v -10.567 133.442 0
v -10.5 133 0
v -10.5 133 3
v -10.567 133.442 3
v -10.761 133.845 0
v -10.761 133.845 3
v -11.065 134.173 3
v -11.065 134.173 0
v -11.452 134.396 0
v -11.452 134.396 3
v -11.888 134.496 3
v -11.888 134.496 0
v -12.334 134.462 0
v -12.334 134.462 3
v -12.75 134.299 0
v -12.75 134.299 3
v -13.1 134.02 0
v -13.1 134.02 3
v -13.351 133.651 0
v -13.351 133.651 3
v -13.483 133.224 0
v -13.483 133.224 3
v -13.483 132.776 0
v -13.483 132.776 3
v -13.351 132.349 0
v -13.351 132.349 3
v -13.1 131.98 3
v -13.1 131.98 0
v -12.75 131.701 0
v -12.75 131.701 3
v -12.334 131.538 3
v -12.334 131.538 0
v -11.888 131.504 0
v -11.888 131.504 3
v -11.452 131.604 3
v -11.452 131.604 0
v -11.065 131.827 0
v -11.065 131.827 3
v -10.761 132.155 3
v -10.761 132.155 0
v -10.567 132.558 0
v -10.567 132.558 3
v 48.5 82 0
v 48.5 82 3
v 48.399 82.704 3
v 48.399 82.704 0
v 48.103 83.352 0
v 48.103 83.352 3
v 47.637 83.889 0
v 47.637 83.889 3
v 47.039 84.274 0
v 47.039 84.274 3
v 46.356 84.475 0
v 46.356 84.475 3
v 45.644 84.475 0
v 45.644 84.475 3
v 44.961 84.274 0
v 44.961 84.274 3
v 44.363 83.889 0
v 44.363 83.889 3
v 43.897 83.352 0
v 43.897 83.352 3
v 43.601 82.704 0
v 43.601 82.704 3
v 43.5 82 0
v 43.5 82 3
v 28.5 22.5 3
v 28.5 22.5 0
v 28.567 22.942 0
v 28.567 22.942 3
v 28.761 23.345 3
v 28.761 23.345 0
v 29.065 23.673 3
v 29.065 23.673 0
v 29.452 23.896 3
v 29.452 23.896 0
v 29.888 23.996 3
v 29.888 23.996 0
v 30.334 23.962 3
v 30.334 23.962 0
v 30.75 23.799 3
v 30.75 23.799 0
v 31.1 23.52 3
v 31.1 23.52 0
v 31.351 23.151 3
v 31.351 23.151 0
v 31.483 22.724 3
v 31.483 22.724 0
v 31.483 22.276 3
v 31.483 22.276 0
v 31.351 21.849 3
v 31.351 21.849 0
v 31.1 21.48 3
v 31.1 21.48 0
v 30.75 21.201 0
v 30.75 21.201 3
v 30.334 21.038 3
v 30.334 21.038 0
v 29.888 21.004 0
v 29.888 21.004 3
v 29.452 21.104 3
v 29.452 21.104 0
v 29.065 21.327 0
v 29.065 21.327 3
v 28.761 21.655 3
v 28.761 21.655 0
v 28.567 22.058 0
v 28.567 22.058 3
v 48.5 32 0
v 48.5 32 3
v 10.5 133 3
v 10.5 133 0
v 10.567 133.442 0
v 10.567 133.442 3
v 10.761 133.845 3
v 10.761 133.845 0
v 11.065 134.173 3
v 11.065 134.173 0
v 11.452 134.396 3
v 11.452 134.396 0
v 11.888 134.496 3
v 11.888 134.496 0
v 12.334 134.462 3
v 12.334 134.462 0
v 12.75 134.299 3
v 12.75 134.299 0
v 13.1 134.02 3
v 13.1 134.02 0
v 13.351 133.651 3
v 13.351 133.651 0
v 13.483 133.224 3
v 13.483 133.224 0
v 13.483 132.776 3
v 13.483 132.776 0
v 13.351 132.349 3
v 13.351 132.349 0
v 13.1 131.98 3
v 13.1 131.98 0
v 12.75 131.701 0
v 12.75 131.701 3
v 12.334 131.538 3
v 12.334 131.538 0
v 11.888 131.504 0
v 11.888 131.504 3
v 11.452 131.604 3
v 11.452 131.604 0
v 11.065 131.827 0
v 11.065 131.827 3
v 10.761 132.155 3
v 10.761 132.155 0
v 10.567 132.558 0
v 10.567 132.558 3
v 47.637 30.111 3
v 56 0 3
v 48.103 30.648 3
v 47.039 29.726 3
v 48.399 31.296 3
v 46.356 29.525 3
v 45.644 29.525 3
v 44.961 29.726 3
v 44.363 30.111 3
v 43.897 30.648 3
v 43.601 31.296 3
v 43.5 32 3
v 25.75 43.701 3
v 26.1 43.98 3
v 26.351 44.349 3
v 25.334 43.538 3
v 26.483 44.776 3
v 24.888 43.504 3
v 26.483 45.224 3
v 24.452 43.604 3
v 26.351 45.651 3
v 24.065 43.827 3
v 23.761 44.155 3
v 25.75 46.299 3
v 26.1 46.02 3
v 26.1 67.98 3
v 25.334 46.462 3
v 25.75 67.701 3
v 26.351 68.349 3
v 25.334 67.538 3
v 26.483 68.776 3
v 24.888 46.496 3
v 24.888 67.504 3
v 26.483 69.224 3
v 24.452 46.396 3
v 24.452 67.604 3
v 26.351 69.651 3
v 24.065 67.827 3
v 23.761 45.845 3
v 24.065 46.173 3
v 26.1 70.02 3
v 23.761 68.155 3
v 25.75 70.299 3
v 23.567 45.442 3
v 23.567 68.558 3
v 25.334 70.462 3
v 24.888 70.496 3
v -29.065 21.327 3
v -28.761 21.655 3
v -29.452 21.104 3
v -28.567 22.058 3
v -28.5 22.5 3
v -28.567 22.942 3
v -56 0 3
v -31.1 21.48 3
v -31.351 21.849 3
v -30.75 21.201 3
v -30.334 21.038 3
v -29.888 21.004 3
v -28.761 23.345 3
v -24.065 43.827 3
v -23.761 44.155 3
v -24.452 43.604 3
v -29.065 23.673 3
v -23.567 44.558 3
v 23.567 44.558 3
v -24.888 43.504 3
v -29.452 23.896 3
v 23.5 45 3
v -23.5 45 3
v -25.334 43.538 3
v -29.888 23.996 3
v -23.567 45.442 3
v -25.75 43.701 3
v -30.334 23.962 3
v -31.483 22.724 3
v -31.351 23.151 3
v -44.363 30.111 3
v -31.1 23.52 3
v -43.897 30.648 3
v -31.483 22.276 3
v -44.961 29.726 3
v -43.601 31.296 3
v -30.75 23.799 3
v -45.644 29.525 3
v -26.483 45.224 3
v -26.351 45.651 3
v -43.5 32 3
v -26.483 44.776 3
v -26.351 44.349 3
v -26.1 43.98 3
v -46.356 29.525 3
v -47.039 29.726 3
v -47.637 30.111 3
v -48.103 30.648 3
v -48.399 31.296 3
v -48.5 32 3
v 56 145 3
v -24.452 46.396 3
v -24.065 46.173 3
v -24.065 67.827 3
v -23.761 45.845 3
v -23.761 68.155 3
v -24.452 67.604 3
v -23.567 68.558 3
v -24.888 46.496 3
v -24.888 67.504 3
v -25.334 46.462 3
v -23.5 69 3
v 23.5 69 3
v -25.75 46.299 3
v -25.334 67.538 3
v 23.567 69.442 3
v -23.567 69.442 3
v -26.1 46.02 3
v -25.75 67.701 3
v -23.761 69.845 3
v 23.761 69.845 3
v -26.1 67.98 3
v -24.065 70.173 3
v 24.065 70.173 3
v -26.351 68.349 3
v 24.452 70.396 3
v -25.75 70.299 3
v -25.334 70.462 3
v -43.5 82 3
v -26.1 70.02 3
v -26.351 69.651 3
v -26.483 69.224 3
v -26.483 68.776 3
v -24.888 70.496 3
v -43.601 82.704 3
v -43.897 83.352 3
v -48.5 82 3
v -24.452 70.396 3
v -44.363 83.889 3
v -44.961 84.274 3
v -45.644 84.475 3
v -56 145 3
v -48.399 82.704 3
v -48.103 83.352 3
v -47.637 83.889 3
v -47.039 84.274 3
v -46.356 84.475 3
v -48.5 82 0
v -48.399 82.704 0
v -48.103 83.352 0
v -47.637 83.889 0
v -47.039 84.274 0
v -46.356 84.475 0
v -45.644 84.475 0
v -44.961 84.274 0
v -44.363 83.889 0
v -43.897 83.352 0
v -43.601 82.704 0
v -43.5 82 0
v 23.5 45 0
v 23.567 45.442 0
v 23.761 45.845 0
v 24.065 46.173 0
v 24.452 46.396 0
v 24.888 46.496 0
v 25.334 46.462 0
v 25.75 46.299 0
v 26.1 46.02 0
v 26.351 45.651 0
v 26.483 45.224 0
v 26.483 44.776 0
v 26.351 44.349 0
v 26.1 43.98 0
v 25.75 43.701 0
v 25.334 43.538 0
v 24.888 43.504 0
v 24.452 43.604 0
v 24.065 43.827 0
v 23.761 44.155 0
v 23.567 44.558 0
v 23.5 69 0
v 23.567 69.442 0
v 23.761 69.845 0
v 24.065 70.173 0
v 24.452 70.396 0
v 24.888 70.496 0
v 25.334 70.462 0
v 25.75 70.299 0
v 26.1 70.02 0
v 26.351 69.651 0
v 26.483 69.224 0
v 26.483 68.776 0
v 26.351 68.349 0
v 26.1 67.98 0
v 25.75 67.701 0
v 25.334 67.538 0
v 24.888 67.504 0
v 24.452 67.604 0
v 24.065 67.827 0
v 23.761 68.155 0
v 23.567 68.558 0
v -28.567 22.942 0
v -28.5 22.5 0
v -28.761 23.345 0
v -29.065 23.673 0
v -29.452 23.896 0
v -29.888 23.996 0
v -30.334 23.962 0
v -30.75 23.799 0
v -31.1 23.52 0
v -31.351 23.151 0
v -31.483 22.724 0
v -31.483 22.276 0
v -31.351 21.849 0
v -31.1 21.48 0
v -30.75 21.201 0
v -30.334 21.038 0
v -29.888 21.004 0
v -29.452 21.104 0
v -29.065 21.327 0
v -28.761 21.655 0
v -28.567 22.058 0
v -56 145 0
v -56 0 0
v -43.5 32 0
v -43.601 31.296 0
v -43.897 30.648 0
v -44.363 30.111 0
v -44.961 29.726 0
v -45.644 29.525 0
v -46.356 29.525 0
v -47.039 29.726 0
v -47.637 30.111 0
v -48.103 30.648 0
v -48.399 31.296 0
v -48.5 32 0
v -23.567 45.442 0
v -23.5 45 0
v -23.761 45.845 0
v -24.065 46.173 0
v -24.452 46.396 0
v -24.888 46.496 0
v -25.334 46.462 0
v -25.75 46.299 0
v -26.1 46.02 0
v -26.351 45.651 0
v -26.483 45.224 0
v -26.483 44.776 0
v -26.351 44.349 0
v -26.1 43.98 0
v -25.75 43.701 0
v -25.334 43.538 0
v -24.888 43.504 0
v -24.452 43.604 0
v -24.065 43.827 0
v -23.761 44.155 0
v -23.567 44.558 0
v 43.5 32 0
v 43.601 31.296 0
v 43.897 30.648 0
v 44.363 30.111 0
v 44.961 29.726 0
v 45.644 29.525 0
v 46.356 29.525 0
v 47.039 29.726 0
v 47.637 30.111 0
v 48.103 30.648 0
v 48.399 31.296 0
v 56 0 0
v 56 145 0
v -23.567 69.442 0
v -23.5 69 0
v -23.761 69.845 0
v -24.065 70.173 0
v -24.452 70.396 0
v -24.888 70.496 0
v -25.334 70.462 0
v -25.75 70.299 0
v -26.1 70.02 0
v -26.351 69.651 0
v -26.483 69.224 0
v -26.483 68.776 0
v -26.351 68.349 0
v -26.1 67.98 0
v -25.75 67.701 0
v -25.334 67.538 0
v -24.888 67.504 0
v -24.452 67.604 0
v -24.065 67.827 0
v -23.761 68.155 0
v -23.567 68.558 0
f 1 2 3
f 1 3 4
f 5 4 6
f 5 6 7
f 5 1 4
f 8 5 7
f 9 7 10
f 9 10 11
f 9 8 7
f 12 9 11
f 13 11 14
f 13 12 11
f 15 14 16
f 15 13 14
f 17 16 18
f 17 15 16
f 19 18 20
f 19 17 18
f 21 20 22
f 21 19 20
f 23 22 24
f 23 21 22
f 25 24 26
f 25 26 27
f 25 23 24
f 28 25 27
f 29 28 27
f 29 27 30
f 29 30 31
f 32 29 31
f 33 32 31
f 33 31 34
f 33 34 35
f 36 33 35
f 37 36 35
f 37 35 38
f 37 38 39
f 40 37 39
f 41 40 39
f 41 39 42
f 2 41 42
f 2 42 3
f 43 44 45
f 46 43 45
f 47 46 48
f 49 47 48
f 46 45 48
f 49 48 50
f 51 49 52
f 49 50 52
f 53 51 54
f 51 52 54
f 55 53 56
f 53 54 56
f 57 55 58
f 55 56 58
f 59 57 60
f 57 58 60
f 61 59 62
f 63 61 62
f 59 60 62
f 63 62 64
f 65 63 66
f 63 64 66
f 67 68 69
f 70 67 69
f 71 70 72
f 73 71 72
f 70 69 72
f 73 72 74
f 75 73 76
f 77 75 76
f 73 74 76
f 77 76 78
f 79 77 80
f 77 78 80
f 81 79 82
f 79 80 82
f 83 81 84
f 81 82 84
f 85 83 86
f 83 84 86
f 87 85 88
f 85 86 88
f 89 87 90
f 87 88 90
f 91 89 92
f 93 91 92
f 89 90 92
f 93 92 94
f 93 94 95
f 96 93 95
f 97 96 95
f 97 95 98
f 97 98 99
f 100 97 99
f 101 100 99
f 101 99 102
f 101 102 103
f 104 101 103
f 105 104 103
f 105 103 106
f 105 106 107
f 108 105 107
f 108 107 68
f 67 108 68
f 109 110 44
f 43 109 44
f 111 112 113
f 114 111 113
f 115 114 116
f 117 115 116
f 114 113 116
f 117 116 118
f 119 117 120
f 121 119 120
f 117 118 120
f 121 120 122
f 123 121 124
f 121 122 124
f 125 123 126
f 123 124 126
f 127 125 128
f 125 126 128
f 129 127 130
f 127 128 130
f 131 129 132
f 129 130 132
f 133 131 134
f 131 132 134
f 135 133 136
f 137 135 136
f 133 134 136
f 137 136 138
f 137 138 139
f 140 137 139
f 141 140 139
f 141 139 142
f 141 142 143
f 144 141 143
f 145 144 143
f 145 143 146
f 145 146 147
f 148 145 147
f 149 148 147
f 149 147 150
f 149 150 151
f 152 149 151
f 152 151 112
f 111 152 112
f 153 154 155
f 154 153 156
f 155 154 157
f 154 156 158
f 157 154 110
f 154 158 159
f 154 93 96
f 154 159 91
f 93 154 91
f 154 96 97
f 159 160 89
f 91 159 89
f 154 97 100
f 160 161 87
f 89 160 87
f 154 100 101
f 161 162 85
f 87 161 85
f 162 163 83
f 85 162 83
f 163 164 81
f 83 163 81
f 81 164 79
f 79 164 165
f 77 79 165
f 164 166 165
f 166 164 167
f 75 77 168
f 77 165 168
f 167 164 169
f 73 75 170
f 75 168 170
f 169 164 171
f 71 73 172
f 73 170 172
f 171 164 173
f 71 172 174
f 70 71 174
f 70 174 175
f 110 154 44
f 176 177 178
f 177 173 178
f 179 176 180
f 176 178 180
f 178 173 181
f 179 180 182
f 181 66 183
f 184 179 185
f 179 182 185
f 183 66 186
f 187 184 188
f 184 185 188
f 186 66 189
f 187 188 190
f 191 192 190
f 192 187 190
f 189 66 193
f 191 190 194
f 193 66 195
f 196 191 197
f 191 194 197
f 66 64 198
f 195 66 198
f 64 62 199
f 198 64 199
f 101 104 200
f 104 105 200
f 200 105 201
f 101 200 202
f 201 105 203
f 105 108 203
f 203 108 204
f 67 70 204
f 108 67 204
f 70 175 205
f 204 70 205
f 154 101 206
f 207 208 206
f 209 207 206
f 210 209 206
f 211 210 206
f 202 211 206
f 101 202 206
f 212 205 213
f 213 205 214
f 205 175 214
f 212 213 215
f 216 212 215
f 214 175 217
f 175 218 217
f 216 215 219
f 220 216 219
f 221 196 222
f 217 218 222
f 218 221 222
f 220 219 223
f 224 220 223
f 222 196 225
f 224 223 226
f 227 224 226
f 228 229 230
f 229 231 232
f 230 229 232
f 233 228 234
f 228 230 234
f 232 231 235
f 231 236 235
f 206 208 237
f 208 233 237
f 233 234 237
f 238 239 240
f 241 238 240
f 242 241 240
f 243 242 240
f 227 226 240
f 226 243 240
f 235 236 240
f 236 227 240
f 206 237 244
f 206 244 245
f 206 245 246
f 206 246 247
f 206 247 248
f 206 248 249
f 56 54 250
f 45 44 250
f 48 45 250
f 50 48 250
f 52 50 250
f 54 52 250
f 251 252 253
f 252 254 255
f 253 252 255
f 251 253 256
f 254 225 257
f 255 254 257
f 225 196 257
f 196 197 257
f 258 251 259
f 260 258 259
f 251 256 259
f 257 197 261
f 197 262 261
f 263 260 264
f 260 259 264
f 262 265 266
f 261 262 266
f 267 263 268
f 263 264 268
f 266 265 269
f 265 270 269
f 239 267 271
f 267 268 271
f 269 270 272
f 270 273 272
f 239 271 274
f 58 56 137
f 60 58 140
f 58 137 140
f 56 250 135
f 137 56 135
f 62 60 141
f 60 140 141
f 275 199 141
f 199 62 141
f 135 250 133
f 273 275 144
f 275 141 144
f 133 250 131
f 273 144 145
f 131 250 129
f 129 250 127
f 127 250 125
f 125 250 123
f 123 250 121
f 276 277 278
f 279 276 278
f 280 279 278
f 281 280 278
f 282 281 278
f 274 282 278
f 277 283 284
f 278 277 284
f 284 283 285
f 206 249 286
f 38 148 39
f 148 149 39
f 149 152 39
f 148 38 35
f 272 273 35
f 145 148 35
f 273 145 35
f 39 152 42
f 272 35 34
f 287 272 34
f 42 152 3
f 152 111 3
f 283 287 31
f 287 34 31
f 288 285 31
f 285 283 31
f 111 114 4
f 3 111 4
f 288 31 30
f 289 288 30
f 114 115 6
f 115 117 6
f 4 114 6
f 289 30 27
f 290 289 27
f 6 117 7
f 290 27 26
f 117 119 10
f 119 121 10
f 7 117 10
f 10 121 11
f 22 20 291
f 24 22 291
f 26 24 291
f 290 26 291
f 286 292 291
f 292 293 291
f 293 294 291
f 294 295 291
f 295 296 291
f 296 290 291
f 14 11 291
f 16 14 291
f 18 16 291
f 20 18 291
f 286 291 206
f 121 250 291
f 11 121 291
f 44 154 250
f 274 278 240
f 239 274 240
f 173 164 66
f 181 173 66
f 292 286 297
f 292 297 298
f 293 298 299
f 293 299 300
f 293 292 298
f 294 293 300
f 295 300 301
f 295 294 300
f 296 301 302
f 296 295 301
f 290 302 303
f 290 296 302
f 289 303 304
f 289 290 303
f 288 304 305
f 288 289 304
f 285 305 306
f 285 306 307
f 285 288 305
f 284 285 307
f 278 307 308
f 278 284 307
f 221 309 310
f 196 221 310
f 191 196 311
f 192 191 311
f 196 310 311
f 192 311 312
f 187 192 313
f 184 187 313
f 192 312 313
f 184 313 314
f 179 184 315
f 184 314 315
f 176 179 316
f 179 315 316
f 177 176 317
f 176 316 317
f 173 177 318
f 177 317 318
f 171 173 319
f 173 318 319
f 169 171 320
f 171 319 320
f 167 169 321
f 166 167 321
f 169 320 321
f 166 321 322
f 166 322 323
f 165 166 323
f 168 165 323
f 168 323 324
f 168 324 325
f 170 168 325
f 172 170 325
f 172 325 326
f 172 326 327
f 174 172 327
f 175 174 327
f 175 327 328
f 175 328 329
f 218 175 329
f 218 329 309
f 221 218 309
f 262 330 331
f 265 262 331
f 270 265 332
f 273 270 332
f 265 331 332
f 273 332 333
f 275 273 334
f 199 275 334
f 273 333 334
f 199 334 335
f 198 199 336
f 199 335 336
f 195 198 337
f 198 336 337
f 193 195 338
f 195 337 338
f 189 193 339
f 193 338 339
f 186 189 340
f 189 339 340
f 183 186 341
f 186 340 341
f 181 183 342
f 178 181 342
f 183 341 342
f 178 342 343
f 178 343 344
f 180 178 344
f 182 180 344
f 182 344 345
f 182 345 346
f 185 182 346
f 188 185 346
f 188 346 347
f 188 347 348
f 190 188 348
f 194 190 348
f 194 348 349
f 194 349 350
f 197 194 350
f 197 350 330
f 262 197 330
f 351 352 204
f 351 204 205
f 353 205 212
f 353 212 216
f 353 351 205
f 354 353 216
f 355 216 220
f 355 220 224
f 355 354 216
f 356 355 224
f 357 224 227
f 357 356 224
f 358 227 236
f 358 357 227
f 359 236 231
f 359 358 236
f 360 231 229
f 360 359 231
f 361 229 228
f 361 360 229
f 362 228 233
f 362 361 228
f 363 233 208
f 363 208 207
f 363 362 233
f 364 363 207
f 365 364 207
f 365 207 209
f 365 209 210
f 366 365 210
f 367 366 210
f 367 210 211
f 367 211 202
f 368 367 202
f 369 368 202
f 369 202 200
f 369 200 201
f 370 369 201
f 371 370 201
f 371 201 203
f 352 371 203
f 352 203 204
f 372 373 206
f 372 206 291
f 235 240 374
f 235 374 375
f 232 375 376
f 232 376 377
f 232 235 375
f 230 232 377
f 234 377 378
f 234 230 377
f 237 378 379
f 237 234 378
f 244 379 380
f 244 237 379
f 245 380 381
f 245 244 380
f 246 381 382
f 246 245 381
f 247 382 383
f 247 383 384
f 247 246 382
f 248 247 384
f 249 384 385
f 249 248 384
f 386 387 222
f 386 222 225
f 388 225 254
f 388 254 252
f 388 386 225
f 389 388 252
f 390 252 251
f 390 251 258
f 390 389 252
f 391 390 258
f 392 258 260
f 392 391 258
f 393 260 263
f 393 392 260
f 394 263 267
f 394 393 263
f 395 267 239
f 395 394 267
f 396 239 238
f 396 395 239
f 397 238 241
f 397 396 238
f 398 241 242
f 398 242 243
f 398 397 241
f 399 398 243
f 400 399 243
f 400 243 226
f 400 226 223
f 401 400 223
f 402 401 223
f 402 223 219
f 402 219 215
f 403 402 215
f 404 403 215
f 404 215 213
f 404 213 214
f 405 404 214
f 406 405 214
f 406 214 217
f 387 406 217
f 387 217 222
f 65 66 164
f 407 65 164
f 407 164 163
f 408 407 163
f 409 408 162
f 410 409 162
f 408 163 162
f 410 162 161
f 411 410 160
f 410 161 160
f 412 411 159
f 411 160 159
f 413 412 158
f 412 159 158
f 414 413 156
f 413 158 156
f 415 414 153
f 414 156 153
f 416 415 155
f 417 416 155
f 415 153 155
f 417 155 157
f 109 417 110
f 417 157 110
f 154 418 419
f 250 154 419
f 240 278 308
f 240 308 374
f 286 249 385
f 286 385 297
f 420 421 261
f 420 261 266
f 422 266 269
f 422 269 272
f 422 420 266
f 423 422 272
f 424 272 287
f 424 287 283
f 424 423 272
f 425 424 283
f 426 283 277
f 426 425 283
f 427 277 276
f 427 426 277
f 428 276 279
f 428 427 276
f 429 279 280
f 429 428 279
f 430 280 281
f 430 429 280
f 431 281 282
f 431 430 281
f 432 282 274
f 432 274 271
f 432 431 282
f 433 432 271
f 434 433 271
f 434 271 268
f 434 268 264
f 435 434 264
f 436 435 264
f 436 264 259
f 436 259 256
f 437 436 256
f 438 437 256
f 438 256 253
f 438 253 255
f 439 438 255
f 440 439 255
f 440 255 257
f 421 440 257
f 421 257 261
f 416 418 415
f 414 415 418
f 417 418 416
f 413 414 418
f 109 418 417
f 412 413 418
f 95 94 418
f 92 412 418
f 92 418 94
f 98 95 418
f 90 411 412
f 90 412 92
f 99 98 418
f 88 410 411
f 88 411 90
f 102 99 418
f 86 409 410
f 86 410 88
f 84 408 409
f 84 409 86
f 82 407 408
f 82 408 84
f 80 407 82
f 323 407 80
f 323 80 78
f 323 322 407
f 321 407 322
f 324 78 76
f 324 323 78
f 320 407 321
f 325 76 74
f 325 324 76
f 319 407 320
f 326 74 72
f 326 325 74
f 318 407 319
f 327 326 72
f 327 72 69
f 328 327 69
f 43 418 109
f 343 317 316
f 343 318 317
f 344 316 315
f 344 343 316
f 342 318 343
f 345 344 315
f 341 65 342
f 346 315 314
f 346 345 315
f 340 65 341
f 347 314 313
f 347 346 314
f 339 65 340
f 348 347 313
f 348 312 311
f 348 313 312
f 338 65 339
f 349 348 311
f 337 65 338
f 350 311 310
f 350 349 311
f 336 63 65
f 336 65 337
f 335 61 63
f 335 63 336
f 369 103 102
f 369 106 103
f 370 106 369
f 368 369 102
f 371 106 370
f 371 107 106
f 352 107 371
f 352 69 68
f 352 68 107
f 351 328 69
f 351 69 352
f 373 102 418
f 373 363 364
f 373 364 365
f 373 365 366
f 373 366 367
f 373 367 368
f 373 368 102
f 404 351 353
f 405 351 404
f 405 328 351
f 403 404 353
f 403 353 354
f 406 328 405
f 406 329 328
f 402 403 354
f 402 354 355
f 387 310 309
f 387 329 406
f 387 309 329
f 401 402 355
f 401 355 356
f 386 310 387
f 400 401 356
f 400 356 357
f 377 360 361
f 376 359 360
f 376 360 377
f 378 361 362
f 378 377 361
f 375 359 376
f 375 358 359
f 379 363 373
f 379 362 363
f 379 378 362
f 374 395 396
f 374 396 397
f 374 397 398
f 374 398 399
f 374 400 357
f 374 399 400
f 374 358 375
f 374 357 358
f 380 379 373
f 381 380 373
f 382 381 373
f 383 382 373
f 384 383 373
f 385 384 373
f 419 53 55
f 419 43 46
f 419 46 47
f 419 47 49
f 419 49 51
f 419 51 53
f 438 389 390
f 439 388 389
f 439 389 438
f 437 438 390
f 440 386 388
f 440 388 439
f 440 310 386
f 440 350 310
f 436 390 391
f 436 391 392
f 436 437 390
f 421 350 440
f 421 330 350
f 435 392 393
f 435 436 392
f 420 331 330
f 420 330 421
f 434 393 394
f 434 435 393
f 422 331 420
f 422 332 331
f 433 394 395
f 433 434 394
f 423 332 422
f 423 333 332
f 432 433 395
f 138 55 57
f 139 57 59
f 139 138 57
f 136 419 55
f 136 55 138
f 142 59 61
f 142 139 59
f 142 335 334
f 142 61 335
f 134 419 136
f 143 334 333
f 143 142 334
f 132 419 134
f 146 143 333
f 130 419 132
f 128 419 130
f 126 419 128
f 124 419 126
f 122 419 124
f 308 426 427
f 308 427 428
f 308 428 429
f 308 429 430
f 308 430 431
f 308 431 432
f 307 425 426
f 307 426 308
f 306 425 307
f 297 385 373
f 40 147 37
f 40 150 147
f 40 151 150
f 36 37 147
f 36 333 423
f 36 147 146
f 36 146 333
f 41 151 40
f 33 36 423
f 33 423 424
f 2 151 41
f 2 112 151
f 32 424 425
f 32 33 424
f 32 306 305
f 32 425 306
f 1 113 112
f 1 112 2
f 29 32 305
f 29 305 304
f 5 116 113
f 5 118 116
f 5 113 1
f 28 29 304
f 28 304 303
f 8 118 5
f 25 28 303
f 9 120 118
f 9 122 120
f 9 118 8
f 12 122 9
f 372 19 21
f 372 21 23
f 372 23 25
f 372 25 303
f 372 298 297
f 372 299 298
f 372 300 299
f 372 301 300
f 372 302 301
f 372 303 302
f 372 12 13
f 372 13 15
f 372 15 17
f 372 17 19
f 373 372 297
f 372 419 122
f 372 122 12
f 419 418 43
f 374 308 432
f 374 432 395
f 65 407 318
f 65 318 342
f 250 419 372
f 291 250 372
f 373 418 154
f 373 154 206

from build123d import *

# Parameters (mm, degrees)
F0_W     = 56
F0_H     = 145
F1_DEPTH = 3
F3_D     = 3
F8_DEPTH = 25
F11_D    = 3
F13_D    = 3


with BuildPart() as f1:
    # F0 (on Top) → F1 (new body)
    with BuildSketch(Plane.XY):
        with Locations((28, 72.5)):
            Rectangle(F0_W, F0_H)
    extrude(amount=F1_DEPTH)

    # F3 (through all)
    with Locations(Plane.XY.offset(3)):
        with Locations((25, 69), (25, 45)):
            Hole(F3_D / 2)

    # F7 (on face) → F8 (cut)
    with BuildSketch(Plane.XY.offset(3)):
        with BuildLine():
            ThreePointArc((48.5, 82), (46, 84.5), (43.5, 82))
            Line((43.5, 82), (43.5, 32))
            ThreePointArc((43.5, 32), (46, 29.5), (48.5, 32))
            Line((48.5, 32), (48.5, 82))
        make_face()
    extrude(amount=-F8_DEPTH, mode=Mode.SUBTRACT)

    # F11 (through all)
    with Locations(Plane.XY.offset(3)):
        with Locations((12, 133)):
            Hole(F11_D / 2)

    # F13 (through all)
    with Locations(Plane.XY.offset(3)):
        with Locations((30, 22.5)):
            Hole(F13_D / 2)

    # F14: F1 across plane


with BuildPart() as f1_1:
    add(f1.part)
    add(f1.part.mirror(Plane.YZ))


solid = f1_1.part
